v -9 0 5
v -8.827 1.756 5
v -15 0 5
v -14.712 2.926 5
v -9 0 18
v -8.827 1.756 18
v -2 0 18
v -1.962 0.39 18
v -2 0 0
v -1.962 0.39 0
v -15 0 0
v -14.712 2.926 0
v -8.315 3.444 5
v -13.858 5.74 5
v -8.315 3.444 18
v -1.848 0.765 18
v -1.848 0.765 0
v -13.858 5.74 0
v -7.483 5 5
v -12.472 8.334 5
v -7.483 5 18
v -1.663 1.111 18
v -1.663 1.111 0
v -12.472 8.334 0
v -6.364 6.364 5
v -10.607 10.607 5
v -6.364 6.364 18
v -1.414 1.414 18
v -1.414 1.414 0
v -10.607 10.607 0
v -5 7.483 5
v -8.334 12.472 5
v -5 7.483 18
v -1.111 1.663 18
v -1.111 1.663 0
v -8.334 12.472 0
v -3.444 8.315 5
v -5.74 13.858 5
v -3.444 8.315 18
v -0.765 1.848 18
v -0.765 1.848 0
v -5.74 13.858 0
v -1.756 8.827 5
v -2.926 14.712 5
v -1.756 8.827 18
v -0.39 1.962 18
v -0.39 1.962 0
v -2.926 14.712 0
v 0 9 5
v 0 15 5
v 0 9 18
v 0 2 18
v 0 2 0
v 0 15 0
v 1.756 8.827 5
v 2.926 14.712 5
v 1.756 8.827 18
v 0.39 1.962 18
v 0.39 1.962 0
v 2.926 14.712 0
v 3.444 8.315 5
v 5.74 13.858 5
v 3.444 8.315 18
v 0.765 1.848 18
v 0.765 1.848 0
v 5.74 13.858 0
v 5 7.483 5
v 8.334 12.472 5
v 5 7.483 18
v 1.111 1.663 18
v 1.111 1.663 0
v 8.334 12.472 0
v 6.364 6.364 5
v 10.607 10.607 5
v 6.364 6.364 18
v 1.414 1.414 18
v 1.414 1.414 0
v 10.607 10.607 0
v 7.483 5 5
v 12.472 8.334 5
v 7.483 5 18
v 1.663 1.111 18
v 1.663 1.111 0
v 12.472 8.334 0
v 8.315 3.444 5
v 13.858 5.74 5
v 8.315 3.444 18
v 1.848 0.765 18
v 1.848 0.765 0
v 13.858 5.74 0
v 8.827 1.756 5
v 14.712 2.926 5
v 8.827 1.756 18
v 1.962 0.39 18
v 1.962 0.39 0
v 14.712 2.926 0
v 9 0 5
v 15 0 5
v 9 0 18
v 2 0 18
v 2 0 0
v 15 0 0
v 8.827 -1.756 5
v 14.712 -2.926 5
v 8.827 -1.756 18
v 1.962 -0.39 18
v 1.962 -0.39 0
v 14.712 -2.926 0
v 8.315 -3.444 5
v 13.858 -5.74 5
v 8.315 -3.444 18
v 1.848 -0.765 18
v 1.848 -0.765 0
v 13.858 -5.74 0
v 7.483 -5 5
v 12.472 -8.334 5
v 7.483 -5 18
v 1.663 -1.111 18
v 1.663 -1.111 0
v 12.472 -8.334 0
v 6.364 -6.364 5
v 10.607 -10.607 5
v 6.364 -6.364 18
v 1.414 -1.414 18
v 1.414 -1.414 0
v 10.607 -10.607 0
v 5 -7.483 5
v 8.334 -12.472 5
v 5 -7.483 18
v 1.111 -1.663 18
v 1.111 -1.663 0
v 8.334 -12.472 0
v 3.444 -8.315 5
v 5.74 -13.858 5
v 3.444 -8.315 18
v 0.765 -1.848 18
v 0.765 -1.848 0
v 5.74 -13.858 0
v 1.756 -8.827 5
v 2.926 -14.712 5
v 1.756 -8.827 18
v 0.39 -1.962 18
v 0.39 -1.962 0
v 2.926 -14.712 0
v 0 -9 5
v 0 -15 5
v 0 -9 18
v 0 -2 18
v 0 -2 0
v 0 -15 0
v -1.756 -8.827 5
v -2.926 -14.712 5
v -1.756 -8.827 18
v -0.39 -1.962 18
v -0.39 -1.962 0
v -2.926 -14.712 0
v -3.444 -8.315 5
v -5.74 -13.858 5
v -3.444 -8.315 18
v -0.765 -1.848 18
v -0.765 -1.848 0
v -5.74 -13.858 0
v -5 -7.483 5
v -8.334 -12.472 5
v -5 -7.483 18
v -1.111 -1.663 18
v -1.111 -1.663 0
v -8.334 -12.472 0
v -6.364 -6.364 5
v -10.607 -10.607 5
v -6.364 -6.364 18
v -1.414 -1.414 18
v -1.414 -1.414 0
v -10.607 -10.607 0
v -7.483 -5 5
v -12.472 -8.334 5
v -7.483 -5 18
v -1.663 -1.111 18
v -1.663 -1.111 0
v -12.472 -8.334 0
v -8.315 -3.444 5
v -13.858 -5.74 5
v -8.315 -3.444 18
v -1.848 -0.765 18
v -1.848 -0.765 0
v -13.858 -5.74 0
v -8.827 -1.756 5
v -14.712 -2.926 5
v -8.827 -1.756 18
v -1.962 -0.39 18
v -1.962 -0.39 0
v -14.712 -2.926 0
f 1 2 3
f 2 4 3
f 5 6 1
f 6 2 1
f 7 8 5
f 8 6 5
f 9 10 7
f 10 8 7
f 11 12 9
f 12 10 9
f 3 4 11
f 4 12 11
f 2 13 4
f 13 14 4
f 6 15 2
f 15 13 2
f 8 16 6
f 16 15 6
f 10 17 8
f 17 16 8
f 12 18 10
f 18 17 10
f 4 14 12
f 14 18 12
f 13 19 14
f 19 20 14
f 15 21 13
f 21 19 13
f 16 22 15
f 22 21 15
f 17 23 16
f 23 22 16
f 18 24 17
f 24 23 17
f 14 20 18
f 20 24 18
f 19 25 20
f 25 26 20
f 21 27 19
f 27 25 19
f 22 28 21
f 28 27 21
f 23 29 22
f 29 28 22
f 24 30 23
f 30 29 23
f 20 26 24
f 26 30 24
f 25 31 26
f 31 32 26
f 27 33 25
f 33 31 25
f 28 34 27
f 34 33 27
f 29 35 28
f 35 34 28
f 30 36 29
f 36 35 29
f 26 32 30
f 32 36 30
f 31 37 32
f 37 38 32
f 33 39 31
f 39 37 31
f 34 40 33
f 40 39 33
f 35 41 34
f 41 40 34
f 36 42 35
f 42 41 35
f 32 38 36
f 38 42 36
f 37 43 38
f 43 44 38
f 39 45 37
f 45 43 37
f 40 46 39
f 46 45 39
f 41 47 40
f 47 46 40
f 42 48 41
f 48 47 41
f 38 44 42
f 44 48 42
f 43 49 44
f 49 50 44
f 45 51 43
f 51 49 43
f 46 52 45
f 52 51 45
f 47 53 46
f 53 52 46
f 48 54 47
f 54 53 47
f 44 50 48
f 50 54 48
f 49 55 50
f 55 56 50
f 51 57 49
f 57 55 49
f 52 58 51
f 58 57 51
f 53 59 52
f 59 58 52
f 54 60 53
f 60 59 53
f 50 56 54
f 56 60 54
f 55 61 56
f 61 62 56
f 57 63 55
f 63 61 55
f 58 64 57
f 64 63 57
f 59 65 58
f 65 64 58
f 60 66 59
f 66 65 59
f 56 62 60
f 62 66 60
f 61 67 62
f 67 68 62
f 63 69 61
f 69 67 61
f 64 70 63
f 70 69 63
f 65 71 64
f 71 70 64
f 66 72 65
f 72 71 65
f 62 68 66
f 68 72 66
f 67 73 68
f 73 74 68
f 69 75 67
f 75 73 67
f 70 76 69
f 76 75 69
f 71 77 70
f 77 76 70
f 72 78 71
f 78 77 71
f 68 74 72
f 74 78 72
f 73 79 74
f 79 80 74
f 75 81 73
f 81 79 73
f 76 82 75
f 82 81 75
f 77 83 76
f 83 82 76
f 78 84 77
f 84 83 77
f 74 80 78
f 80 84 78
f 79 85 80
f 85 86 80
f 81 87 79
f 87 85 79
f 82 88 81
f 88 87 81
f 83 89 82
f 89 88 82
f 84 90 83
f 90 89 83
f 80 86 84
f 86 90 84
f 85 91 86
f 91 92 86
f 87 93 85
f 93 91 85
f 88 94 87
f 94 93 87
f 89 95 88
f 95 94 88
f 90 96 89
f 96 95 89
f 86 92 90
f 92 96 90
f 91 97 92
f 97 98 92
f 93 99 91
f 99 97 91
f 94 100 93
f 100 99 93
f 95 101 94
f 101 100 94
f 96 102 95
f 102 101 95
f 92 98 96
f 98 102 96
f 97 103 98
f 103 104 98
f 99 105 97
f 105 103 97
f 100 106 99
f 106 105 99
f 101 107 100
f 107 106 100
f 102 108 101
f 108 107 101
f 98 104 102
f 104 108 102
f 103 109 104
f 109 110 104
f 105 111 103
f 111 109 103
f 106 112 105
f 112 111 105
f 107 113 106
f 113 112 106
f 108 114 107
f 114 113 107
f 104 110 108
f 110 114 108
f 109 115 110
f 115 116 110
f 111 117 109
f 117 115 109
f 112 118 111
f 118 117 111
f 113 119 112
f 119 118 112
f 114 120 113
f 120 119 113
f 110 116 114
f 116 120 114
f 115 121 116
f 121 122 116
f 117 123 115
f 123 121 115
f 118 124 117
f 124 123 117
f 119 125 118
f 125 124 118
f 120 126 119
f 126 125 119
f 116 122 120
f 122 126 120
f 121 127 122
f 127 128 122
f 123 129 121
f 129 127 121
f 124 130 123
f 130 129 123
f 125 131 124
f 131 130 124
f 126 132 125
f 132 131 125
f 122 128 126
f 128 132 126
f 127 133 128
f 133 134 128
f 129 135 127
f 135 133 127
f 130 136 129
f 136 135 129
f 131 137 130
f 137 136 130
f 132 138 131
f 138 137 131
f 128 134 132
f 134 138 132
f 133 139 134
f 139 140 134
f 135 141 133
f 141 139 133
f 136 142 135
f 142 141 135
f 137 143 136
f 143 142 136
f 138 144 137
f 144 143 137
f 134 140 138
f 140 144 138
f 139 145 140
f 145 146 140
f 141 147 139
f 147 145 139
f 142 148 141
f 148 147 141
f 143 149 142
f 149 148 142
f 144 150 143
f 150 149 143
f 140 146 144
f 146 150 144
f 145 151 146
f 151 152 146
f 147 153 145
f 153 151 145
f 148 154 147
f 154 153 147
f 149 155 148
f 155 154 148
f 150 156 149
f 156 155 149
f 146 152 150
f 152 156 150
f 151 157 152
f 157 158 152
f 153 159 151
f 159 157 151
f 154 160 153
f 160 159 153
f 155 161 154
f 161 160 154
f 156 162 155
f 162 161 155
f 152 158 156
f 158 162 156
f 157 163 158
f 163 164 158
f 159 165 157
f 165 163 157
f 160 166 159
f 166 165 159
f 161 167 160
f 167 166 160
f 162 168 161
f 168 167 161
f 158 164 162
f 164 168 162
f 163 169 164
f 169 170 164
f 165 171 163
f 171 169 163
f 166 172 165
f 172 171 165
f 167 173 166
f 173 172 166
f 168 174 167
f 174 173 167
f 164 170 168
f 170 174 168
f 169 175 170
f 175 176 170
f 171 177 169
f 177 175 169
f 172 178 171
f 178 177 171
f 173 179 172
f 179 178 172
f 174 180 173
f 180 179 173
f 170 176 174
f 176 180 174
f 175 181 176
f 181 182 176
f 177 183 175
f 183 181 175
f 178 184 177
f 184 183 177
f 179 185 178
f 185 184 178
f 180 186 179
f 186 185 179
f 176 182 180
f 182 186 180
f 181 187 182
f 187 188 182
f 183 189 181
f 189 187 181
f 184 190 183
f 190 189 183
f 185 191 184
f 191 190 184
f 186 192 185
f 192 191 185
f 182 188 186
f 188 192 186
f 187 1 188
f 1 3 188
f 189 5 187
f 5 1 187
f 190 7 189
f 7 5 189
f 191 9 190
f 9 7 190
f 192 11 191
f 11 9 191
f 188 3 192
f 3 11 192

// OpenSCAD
$fn = 32;

// ----------------------------------------------------------------------
// Profiled standoff: flanged spacer, 18 mm long, bore 4 mm
// ----------------------------------------------------------------------

// --- parameters (mm) ---
revolve_angle = 360;      // full turn around the Z axis
profile_points = 6;       // points of the closed outline

profile = [[2, 0], [15, 0], [15, 5], [9, 5], [9, 18], [2, 18]];  // single closed polygon, 6 points, counter clockwise

// --- the one profile operation ---
rotate_extrude(angle = revolve_angle) polygon(points = profile);
